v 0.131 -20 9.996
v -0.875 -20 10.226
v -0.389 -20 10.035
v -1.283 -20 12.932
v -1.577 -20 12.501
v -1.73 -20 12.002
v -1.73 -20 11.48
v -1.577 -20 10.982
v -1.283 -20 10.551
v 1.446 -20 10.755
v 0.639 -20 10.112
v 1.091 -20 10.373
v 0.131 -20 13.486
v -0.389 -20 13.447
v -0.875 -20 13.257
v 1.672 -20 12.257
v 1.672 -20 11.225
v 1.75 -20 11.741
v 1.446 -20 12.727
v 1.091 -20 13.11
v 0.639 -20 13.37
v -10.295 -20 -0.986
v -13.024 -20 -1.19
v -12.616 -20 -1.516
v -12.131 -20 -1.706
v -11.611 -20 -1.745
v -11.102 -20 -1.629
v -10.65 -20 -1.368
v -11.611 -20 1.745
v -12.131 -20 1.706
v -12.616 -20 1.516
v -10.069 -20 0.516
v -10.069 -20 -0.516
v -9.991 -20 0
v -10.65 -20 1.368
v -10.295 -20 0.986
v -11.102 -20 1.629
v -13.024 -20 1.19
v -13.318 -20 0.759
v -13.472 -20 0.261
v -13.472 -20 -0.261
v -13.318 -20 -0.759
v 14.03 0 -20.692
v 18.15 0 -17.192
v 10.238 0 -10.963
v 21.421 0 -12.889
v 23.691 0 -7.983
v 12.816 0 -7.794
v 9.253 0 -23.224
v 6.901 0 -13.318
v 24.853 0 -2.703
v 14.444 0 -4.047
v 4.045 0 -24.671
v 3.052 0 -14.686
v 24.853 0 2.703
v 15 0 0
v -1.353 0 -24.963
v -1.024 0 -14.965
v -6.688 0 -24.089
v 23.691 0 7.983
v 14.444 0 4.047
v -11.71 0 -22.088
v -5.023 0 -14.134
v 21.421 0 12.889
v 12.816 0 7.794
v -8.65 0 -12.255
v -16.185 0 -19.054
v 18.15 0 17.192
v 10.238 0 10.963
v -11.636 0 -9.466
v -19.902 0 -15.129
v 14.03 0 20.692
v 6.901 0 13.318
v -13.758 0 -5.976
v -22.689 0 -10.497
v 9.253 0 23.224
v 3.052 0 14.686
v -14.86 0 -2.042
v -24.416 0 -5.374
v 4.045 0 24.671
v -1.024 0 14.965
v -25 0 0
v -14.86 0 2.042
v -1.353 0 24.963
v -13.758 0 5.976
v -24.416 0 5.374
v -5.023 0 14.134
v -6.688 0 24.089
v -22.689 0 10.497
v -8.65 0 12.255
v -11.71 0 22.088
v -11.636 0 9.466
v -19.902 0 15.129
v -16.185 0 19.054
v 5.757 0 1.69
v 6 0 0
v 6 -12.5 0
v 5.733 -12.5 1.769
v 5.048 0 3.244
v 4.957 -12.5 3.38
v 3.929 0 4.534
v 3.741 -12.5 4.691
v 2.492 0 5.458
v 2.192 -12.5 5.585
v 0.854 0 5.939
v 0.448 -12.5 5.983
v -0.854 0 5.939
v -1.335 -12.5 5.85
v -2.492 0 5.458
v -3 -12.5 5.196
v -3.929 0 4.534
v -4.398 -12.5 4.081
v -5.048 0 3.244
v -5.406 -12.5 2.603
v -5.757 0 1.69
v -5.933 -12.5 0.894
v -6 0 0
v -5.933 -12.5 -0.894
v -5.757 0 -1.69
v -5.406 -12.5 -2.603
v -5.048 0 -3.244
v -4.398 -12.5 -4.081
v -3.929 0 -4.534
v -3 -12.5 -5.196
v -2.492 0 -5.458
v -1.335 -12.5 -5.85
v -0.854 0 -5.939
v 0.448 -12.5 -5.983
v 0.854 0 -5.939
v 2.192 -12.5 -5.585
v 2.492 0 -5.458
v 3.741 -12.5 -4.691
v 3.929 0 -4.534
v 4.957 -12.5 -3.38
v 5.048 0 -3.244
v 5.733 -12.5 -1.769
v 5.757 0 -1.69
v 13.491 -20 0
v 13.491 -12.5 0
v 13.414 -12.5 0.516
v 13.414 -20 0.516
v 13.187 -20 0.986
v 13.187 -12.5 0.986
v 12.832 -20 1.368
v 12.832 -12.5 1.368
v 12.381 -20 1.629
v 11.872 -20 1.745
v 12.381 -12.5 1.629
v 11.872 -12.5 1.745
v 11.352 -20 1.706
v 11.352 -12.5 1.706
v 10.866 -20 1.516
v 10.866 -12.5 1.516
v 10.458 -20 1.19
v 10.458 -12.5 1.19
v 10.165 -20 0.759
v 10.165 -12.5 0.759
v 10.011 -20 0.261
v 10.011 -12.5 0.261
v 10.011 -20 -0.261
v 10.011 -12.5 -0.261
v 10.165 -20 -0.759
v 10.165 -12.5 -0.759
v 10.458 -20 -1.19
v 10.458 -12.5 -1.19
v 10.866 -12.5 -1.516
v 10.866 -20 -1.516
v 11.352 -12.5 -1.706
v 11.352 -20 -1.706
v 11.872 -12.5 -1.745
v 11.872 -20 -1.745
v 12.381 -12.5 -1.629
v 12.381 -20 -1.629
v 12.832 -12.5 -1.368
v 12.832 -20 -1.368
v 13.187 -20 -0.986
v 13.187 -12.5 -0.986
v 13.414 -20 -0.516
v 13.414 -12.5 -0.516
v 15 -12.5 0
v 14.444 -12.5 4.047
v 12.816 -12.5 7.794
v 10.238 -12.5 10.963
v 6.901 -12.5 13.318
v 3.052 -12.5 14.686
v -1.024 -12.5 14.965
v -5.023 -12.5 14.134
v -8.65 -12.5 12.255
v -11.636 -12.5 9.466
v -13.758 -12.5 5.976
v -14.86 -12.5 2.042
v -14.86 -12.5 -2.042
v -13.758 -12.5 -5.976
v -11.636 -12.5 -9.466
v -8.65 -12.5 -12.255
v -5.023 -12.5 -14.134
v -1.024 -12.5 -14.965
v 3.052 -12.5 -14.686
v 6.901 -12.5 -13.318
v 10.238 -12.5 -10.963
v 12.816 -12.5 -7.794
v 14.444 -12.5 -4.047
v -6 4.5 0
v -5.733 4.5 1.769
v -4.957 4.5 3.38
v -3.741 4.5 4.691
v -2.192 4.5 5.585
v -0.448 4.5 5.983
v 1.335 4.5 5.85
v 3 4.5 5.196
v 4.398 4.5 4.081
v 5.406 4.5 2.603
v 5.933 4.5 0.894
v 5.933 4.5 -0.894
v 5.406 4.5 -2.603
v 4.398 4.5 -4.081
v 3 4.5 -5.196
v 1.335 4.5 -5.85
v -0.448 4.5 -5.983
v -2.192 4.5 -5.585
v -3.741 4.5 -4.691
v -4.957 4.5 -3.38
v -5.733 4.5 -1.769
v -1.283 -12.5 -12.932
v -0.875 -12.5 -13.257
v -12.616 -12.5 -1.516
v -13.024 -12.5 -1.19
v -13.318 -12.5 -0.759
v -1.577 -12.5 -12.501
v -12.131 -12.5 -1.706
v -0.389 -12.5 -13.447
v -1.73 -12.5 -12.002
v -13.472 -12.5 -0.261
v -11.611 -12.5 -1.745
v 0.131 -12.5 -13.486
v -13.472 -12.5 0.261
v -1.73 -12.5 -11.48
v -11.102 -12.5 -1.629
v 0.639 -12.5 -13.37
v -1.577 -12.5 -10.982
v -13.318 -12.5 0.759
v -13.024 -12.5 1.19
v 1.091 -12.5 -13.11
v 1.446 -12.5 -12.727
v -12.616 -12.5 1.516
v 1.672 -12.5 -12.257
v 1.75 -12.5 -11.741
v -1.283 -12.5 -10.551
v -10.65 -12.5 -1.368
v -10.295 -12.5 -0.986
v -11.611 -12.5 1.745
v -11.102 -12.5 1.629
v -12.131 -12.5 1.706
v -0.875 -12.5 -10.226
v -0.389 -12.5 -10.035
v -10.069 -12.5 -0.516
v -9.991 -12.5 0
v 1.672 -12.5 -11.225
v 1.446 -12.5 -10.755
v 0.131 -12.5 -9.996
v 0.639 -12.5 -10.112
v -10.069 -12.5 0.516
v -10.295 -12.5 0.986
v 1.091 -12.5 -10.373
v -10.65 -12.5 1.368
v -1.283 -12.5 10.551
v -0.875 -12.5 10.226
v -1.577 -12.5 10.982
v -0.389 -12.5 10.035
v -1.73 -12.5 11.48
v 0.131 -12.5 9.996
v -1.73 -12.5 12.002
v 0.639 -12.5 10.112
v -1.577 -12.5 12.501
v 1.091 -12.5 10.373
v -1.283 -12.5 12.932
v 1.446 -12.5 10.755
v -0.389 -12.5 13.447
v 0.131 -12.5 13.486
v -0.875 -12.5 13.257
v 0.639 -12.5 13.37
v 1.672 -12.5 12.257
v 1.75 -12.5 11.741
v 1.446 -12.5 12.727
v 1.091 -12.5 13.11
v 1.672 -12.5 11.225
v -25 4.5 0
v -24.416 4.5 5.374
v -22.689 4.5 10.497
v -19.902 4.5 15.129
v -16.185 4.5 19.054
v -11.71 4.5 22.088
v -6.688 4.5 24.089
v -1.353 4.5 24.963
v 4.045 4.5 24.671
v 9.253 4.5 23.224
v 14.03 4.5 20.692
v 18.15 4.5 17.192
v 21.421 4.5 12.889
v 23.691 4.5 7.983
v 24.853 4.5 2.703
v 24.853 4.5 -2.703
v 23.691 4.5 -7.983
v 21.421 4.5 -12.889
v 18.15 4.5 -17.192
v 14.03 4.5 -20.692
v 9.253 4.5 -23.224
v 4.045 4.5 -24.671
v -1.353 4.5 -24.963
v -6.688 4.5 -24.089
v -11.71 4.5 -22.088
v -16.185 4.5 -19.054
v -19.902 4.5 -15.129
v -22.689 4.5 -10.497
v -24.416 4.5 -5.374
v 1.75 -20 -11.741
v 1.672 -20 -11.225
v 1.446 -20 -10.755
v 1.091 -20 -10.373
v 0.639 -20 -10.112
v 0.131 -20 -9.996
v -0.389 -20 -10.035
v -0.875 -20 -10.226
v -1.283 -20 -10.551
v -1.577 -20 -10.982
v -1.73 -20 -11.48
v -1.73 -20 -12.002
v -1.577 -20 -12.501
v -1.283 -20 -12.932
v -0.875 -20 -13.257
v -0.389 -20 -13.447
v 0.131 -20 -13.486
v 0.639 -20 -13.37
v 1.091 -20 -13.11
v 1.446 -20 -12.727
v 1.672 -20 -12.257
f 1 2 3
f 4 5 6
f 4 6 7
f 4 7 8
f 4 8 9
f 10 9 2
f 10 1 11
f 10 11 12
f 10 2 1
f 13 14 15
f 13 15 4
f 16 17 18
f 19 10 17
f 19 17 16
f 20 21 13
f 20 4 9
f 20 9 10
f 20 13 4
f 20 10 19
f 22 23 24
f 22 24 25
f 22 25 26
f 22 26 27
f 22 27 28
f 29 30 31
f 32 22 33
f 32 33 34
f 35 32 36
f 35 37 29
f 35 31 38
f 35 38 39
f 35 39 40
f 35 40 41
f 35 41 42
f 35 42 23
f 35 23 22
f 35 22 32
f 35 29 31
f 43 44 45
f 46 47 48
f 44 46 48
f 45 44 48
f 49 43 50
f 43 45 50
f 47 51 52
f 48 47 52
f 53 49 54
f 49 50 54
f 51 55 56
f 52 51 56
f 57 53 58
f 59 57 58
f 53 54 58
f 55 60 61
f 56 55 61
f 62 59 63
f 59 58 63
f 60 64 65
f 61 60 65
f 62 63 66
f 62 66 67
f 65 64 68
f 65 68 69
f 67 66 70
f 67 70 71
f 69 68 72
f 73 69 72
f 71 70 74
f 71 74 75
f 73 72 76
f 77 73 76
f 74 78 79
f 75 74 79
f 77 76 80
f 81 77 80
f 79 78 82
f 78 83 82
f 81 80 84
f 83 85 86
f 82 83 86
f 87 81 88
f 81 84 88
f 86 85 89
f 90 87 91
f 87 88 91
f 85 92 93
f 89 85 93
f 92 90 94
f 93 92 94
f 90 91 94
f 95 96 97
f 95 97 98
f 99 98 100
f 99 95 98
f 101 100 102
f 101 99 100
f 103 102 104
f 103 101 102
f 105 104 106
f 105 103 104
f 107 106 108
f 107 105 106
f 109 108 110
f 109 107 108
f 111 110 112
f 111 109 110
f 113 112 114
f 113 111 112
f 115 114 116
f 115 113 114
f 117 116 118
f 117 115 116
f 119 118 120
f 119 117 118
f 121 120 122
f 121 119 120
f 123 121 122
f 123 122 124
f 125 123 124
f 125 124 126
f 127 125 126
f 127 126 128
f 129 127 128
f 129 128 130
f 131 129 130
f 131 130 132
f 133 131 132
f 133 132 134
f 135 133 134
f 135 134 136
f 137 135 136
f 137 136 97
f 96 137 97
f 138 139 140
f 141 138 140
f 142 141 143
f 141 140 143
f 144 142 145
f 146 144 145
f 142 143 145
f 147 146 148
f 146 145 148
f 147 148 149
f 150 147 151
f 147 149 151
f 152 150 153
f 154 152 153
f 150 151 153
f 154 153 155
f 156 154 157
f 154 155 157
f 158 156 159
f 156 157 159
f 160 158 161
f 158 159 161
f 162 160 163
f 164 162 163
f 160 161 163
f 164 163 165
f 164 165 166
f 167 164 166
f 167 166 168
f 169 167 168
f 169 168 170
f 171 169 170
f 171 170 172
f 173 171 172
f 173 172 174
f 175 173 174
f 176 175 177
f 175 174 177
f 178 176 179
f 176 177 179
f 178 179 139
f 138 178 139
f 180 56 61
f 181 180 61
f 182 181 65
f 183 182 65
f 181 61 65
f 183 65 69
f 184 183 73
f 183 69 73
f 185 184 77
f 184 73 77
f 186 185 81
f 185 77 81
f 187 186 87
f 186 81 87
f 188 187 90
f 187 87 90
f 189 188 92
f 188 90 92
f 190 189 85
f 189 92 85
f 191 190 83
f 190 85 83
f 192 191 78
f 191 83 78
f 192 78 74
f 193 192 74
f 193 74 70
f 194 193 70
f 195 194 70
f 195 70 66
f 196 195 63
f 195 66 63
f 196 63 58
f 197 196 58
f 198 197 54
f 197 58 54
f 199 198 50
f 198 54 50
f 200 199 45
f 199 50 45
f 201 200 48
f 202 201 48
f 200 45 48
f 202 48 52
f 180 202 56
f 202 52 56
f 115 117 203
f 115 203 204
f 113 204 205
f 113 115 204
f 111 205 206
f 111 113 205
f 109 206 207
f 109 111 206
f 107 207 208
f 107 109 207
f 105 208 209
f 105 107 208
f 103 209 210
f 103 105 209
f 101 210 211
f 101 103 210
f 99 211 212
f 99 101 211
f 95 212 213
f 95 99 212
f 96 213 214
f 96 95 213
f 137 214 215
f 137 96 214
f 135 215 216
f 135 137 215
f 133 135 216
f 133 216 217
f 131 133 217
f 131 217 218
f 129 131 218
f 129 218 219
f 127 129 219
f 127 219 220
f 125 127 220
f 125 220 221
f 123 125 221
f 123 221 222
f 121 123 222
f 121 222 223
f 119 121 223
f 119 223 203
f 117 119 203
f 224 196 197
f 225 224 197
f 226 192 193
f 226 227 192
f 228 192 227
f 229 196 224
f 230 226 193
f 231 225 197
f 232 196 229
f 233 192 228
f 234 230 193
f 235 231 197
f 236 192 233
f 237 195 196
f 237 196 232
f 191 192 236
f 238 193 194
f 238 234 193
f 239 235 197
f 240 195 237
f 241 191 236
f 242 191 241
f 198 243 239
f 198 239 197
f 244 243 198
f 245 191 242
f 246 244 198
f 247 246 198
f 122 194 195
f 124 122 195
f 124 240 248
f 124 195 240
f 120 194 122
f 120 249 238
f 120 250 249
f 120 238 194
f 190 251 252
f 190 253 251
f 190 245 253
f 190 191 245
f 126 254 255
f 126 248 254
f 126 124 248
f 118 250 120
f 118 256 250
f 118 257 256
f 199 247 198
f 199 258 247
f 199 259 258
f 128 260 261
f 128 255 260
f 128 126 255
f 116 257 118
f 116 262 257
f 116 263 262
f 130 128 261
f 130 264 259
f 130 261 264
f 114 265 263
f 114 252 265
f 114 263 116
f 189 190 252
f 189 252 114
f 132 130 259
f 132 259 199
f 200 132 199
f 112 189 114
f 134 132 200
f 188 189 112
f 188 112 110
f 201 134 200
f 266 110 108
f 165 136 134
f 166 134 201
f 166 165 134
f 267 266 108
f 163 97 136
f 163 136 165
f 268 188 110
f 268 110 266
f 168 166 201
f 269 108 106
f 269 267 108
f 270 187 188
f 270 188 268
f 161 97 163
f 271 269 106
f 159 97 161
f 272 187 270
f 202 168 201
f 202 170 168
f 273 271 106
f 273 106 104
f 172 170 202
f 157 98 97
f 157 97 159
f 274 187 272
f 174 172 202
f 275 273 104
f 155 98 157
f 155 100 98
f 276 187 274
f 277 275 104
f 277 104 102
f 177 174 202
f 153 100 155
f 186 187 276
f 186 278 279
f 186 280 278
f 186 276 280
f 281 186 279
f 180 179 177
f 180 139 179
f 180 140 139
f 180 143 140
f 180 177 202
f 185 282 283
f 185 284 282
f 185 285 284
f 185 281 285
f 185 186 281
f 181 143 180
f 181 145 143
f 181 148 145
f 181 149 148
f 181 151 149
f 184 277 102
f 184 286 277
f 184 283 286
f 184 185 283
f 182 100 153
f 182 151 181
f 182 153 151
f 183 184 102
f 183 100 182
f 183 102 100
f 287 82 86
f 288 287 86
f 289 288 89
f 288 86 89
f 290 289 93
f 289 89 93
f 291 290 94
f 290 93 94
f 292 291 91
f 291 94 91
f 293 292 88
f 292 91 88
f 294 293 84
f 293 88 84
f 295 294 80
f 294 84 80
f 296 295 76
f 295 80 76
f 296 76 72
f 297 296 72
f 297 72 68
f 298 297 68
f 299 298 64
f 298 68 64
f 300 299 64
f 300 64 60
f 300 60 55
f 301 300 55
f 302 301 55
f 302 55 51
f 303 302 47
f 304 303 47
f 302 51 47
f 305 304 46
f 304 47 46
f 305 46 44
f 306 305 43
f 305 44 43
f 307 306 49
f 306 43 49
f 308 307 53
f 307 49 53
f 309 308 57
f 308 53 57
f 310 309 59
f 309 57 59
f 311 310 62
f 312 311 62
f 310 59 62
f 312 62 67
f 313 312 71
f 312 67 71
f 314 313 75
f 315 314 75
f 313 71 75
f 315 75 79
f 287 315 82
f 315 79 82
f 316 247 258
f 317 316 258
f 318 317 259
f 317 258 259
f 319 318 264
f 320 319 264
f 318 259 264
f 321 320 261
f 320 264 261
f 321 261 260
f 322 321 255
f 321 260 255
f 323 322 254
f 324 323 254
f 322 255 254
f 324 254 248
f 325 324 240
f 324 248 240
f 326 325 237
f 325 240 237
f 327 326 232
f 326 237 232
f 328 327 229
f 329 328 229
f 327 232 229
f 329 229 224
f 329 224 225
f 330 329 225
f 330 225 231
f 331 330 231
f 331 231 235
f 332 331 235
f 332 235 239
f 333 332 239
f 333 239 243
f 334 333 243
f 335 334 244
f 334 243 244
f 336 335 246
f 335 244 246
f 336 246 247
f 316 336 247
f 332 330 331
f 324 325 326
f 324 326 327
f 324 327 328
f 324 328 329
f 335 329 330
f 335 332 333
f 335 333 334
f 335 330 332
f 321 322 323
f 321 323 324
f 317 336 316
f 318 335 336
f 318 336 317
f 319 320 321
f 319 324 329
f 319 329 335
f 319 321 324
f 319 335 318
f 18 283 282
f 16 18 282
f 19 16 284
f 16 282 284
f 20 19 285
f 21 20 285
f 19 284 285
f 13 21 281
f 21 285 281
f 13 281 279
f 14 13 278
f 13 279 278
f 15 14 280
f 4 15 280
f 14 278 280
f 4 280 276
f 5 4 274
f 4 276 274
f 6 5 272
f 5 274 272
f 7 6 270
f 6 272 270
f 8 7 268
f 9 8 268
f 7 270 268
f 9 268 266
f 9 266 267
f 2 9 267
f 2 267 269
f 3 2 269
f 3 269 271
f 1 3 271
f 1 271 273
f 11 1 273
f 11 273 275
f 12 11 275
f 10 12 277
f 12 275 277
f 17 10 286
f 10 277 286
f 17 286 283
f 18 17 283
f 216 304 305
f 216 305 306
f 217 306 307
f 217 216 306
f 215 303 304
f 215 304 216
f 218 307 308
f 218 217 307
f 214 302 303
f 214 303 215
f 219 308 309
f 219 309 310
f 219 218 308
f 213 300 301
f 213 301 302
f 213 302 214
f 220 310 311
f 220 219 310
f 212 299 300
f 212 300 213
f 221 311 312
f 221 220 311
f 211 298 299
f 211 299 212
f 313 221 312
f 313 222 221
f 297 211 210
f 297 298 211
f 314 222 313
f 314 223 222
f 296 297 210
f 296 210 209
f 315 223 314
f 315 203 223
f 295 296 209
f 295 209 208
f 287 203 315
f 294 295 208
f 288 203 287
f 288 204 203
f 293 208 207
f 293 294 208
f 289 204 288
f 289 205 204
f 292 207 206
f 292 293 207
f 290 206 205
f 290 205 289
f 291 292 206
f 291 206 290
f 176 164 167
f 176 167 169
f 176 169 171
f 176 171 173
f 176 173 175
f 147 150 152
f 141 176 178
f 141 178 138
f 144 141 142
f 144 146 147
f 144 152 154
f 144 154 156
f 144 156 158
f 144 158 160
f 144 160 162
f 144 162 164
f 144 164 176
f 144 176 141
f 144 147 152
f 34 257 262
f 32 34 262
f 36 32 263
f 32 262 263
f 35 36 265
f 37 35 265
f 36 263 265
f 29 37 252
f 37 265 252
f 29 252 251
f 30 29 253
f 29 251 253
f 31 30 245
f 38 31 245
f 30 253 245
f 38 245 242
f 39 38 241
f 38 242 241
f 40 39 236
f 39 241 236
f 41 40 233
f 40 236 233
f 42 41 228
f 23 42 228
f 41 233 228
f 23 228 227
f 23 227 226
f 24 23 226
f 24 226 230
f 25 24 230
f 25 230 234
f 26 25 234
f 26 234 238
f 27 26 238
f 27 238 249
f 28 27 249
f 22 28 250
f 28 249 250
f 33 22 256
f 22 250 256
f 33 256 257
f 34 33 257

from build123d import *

# Parameters (mm, degrees)
F0_R     = 15
F0_R_2   = 6
F1_DEPTH = 12.5
F3_R     = 25
F3_R_2   = 6
F4_DEPTH = 4.5
F5_R     = 1.75
F6_DEPTH = 7.5


with BuildPart() as f1:
    # F0 (on Front) → F1 (new body)
    with BuildSketch(Plane.XZ):
        Circle(F0_R)
        Circle(F0_R_2, mode=Mode.SUBTRACT)
    extrude(amount=F1_DEPTH)

    # F3 (on face) → F4 (join)
    with BuildSketch(Plane(origin=(0, 0, 0), x_dir=(-1, 0, 0), z_dir=(0, 1, 0))):
        Circle(F3_R)
        Circle(F3_R_2, mode=Mode.SUBTRACT)
    extrude(amount=F4_DEPTH)

    # F5 (on face) → F6 (join)
    with BuildSketch(Plane.XZ.offset(12.5)):
        with Locations((0, 11.741299)):
            Circle(F5_R)
        with Locations((-11.741299, 0)):
            Circle(F5_R)
        with Locations((11.741299, 0)):
            Circle(F5_R)
        with Locations((0, -11.741299)):
            Circle(F5_R)
    extrude(amount=F6_DEPTH)


solid = f1.part
